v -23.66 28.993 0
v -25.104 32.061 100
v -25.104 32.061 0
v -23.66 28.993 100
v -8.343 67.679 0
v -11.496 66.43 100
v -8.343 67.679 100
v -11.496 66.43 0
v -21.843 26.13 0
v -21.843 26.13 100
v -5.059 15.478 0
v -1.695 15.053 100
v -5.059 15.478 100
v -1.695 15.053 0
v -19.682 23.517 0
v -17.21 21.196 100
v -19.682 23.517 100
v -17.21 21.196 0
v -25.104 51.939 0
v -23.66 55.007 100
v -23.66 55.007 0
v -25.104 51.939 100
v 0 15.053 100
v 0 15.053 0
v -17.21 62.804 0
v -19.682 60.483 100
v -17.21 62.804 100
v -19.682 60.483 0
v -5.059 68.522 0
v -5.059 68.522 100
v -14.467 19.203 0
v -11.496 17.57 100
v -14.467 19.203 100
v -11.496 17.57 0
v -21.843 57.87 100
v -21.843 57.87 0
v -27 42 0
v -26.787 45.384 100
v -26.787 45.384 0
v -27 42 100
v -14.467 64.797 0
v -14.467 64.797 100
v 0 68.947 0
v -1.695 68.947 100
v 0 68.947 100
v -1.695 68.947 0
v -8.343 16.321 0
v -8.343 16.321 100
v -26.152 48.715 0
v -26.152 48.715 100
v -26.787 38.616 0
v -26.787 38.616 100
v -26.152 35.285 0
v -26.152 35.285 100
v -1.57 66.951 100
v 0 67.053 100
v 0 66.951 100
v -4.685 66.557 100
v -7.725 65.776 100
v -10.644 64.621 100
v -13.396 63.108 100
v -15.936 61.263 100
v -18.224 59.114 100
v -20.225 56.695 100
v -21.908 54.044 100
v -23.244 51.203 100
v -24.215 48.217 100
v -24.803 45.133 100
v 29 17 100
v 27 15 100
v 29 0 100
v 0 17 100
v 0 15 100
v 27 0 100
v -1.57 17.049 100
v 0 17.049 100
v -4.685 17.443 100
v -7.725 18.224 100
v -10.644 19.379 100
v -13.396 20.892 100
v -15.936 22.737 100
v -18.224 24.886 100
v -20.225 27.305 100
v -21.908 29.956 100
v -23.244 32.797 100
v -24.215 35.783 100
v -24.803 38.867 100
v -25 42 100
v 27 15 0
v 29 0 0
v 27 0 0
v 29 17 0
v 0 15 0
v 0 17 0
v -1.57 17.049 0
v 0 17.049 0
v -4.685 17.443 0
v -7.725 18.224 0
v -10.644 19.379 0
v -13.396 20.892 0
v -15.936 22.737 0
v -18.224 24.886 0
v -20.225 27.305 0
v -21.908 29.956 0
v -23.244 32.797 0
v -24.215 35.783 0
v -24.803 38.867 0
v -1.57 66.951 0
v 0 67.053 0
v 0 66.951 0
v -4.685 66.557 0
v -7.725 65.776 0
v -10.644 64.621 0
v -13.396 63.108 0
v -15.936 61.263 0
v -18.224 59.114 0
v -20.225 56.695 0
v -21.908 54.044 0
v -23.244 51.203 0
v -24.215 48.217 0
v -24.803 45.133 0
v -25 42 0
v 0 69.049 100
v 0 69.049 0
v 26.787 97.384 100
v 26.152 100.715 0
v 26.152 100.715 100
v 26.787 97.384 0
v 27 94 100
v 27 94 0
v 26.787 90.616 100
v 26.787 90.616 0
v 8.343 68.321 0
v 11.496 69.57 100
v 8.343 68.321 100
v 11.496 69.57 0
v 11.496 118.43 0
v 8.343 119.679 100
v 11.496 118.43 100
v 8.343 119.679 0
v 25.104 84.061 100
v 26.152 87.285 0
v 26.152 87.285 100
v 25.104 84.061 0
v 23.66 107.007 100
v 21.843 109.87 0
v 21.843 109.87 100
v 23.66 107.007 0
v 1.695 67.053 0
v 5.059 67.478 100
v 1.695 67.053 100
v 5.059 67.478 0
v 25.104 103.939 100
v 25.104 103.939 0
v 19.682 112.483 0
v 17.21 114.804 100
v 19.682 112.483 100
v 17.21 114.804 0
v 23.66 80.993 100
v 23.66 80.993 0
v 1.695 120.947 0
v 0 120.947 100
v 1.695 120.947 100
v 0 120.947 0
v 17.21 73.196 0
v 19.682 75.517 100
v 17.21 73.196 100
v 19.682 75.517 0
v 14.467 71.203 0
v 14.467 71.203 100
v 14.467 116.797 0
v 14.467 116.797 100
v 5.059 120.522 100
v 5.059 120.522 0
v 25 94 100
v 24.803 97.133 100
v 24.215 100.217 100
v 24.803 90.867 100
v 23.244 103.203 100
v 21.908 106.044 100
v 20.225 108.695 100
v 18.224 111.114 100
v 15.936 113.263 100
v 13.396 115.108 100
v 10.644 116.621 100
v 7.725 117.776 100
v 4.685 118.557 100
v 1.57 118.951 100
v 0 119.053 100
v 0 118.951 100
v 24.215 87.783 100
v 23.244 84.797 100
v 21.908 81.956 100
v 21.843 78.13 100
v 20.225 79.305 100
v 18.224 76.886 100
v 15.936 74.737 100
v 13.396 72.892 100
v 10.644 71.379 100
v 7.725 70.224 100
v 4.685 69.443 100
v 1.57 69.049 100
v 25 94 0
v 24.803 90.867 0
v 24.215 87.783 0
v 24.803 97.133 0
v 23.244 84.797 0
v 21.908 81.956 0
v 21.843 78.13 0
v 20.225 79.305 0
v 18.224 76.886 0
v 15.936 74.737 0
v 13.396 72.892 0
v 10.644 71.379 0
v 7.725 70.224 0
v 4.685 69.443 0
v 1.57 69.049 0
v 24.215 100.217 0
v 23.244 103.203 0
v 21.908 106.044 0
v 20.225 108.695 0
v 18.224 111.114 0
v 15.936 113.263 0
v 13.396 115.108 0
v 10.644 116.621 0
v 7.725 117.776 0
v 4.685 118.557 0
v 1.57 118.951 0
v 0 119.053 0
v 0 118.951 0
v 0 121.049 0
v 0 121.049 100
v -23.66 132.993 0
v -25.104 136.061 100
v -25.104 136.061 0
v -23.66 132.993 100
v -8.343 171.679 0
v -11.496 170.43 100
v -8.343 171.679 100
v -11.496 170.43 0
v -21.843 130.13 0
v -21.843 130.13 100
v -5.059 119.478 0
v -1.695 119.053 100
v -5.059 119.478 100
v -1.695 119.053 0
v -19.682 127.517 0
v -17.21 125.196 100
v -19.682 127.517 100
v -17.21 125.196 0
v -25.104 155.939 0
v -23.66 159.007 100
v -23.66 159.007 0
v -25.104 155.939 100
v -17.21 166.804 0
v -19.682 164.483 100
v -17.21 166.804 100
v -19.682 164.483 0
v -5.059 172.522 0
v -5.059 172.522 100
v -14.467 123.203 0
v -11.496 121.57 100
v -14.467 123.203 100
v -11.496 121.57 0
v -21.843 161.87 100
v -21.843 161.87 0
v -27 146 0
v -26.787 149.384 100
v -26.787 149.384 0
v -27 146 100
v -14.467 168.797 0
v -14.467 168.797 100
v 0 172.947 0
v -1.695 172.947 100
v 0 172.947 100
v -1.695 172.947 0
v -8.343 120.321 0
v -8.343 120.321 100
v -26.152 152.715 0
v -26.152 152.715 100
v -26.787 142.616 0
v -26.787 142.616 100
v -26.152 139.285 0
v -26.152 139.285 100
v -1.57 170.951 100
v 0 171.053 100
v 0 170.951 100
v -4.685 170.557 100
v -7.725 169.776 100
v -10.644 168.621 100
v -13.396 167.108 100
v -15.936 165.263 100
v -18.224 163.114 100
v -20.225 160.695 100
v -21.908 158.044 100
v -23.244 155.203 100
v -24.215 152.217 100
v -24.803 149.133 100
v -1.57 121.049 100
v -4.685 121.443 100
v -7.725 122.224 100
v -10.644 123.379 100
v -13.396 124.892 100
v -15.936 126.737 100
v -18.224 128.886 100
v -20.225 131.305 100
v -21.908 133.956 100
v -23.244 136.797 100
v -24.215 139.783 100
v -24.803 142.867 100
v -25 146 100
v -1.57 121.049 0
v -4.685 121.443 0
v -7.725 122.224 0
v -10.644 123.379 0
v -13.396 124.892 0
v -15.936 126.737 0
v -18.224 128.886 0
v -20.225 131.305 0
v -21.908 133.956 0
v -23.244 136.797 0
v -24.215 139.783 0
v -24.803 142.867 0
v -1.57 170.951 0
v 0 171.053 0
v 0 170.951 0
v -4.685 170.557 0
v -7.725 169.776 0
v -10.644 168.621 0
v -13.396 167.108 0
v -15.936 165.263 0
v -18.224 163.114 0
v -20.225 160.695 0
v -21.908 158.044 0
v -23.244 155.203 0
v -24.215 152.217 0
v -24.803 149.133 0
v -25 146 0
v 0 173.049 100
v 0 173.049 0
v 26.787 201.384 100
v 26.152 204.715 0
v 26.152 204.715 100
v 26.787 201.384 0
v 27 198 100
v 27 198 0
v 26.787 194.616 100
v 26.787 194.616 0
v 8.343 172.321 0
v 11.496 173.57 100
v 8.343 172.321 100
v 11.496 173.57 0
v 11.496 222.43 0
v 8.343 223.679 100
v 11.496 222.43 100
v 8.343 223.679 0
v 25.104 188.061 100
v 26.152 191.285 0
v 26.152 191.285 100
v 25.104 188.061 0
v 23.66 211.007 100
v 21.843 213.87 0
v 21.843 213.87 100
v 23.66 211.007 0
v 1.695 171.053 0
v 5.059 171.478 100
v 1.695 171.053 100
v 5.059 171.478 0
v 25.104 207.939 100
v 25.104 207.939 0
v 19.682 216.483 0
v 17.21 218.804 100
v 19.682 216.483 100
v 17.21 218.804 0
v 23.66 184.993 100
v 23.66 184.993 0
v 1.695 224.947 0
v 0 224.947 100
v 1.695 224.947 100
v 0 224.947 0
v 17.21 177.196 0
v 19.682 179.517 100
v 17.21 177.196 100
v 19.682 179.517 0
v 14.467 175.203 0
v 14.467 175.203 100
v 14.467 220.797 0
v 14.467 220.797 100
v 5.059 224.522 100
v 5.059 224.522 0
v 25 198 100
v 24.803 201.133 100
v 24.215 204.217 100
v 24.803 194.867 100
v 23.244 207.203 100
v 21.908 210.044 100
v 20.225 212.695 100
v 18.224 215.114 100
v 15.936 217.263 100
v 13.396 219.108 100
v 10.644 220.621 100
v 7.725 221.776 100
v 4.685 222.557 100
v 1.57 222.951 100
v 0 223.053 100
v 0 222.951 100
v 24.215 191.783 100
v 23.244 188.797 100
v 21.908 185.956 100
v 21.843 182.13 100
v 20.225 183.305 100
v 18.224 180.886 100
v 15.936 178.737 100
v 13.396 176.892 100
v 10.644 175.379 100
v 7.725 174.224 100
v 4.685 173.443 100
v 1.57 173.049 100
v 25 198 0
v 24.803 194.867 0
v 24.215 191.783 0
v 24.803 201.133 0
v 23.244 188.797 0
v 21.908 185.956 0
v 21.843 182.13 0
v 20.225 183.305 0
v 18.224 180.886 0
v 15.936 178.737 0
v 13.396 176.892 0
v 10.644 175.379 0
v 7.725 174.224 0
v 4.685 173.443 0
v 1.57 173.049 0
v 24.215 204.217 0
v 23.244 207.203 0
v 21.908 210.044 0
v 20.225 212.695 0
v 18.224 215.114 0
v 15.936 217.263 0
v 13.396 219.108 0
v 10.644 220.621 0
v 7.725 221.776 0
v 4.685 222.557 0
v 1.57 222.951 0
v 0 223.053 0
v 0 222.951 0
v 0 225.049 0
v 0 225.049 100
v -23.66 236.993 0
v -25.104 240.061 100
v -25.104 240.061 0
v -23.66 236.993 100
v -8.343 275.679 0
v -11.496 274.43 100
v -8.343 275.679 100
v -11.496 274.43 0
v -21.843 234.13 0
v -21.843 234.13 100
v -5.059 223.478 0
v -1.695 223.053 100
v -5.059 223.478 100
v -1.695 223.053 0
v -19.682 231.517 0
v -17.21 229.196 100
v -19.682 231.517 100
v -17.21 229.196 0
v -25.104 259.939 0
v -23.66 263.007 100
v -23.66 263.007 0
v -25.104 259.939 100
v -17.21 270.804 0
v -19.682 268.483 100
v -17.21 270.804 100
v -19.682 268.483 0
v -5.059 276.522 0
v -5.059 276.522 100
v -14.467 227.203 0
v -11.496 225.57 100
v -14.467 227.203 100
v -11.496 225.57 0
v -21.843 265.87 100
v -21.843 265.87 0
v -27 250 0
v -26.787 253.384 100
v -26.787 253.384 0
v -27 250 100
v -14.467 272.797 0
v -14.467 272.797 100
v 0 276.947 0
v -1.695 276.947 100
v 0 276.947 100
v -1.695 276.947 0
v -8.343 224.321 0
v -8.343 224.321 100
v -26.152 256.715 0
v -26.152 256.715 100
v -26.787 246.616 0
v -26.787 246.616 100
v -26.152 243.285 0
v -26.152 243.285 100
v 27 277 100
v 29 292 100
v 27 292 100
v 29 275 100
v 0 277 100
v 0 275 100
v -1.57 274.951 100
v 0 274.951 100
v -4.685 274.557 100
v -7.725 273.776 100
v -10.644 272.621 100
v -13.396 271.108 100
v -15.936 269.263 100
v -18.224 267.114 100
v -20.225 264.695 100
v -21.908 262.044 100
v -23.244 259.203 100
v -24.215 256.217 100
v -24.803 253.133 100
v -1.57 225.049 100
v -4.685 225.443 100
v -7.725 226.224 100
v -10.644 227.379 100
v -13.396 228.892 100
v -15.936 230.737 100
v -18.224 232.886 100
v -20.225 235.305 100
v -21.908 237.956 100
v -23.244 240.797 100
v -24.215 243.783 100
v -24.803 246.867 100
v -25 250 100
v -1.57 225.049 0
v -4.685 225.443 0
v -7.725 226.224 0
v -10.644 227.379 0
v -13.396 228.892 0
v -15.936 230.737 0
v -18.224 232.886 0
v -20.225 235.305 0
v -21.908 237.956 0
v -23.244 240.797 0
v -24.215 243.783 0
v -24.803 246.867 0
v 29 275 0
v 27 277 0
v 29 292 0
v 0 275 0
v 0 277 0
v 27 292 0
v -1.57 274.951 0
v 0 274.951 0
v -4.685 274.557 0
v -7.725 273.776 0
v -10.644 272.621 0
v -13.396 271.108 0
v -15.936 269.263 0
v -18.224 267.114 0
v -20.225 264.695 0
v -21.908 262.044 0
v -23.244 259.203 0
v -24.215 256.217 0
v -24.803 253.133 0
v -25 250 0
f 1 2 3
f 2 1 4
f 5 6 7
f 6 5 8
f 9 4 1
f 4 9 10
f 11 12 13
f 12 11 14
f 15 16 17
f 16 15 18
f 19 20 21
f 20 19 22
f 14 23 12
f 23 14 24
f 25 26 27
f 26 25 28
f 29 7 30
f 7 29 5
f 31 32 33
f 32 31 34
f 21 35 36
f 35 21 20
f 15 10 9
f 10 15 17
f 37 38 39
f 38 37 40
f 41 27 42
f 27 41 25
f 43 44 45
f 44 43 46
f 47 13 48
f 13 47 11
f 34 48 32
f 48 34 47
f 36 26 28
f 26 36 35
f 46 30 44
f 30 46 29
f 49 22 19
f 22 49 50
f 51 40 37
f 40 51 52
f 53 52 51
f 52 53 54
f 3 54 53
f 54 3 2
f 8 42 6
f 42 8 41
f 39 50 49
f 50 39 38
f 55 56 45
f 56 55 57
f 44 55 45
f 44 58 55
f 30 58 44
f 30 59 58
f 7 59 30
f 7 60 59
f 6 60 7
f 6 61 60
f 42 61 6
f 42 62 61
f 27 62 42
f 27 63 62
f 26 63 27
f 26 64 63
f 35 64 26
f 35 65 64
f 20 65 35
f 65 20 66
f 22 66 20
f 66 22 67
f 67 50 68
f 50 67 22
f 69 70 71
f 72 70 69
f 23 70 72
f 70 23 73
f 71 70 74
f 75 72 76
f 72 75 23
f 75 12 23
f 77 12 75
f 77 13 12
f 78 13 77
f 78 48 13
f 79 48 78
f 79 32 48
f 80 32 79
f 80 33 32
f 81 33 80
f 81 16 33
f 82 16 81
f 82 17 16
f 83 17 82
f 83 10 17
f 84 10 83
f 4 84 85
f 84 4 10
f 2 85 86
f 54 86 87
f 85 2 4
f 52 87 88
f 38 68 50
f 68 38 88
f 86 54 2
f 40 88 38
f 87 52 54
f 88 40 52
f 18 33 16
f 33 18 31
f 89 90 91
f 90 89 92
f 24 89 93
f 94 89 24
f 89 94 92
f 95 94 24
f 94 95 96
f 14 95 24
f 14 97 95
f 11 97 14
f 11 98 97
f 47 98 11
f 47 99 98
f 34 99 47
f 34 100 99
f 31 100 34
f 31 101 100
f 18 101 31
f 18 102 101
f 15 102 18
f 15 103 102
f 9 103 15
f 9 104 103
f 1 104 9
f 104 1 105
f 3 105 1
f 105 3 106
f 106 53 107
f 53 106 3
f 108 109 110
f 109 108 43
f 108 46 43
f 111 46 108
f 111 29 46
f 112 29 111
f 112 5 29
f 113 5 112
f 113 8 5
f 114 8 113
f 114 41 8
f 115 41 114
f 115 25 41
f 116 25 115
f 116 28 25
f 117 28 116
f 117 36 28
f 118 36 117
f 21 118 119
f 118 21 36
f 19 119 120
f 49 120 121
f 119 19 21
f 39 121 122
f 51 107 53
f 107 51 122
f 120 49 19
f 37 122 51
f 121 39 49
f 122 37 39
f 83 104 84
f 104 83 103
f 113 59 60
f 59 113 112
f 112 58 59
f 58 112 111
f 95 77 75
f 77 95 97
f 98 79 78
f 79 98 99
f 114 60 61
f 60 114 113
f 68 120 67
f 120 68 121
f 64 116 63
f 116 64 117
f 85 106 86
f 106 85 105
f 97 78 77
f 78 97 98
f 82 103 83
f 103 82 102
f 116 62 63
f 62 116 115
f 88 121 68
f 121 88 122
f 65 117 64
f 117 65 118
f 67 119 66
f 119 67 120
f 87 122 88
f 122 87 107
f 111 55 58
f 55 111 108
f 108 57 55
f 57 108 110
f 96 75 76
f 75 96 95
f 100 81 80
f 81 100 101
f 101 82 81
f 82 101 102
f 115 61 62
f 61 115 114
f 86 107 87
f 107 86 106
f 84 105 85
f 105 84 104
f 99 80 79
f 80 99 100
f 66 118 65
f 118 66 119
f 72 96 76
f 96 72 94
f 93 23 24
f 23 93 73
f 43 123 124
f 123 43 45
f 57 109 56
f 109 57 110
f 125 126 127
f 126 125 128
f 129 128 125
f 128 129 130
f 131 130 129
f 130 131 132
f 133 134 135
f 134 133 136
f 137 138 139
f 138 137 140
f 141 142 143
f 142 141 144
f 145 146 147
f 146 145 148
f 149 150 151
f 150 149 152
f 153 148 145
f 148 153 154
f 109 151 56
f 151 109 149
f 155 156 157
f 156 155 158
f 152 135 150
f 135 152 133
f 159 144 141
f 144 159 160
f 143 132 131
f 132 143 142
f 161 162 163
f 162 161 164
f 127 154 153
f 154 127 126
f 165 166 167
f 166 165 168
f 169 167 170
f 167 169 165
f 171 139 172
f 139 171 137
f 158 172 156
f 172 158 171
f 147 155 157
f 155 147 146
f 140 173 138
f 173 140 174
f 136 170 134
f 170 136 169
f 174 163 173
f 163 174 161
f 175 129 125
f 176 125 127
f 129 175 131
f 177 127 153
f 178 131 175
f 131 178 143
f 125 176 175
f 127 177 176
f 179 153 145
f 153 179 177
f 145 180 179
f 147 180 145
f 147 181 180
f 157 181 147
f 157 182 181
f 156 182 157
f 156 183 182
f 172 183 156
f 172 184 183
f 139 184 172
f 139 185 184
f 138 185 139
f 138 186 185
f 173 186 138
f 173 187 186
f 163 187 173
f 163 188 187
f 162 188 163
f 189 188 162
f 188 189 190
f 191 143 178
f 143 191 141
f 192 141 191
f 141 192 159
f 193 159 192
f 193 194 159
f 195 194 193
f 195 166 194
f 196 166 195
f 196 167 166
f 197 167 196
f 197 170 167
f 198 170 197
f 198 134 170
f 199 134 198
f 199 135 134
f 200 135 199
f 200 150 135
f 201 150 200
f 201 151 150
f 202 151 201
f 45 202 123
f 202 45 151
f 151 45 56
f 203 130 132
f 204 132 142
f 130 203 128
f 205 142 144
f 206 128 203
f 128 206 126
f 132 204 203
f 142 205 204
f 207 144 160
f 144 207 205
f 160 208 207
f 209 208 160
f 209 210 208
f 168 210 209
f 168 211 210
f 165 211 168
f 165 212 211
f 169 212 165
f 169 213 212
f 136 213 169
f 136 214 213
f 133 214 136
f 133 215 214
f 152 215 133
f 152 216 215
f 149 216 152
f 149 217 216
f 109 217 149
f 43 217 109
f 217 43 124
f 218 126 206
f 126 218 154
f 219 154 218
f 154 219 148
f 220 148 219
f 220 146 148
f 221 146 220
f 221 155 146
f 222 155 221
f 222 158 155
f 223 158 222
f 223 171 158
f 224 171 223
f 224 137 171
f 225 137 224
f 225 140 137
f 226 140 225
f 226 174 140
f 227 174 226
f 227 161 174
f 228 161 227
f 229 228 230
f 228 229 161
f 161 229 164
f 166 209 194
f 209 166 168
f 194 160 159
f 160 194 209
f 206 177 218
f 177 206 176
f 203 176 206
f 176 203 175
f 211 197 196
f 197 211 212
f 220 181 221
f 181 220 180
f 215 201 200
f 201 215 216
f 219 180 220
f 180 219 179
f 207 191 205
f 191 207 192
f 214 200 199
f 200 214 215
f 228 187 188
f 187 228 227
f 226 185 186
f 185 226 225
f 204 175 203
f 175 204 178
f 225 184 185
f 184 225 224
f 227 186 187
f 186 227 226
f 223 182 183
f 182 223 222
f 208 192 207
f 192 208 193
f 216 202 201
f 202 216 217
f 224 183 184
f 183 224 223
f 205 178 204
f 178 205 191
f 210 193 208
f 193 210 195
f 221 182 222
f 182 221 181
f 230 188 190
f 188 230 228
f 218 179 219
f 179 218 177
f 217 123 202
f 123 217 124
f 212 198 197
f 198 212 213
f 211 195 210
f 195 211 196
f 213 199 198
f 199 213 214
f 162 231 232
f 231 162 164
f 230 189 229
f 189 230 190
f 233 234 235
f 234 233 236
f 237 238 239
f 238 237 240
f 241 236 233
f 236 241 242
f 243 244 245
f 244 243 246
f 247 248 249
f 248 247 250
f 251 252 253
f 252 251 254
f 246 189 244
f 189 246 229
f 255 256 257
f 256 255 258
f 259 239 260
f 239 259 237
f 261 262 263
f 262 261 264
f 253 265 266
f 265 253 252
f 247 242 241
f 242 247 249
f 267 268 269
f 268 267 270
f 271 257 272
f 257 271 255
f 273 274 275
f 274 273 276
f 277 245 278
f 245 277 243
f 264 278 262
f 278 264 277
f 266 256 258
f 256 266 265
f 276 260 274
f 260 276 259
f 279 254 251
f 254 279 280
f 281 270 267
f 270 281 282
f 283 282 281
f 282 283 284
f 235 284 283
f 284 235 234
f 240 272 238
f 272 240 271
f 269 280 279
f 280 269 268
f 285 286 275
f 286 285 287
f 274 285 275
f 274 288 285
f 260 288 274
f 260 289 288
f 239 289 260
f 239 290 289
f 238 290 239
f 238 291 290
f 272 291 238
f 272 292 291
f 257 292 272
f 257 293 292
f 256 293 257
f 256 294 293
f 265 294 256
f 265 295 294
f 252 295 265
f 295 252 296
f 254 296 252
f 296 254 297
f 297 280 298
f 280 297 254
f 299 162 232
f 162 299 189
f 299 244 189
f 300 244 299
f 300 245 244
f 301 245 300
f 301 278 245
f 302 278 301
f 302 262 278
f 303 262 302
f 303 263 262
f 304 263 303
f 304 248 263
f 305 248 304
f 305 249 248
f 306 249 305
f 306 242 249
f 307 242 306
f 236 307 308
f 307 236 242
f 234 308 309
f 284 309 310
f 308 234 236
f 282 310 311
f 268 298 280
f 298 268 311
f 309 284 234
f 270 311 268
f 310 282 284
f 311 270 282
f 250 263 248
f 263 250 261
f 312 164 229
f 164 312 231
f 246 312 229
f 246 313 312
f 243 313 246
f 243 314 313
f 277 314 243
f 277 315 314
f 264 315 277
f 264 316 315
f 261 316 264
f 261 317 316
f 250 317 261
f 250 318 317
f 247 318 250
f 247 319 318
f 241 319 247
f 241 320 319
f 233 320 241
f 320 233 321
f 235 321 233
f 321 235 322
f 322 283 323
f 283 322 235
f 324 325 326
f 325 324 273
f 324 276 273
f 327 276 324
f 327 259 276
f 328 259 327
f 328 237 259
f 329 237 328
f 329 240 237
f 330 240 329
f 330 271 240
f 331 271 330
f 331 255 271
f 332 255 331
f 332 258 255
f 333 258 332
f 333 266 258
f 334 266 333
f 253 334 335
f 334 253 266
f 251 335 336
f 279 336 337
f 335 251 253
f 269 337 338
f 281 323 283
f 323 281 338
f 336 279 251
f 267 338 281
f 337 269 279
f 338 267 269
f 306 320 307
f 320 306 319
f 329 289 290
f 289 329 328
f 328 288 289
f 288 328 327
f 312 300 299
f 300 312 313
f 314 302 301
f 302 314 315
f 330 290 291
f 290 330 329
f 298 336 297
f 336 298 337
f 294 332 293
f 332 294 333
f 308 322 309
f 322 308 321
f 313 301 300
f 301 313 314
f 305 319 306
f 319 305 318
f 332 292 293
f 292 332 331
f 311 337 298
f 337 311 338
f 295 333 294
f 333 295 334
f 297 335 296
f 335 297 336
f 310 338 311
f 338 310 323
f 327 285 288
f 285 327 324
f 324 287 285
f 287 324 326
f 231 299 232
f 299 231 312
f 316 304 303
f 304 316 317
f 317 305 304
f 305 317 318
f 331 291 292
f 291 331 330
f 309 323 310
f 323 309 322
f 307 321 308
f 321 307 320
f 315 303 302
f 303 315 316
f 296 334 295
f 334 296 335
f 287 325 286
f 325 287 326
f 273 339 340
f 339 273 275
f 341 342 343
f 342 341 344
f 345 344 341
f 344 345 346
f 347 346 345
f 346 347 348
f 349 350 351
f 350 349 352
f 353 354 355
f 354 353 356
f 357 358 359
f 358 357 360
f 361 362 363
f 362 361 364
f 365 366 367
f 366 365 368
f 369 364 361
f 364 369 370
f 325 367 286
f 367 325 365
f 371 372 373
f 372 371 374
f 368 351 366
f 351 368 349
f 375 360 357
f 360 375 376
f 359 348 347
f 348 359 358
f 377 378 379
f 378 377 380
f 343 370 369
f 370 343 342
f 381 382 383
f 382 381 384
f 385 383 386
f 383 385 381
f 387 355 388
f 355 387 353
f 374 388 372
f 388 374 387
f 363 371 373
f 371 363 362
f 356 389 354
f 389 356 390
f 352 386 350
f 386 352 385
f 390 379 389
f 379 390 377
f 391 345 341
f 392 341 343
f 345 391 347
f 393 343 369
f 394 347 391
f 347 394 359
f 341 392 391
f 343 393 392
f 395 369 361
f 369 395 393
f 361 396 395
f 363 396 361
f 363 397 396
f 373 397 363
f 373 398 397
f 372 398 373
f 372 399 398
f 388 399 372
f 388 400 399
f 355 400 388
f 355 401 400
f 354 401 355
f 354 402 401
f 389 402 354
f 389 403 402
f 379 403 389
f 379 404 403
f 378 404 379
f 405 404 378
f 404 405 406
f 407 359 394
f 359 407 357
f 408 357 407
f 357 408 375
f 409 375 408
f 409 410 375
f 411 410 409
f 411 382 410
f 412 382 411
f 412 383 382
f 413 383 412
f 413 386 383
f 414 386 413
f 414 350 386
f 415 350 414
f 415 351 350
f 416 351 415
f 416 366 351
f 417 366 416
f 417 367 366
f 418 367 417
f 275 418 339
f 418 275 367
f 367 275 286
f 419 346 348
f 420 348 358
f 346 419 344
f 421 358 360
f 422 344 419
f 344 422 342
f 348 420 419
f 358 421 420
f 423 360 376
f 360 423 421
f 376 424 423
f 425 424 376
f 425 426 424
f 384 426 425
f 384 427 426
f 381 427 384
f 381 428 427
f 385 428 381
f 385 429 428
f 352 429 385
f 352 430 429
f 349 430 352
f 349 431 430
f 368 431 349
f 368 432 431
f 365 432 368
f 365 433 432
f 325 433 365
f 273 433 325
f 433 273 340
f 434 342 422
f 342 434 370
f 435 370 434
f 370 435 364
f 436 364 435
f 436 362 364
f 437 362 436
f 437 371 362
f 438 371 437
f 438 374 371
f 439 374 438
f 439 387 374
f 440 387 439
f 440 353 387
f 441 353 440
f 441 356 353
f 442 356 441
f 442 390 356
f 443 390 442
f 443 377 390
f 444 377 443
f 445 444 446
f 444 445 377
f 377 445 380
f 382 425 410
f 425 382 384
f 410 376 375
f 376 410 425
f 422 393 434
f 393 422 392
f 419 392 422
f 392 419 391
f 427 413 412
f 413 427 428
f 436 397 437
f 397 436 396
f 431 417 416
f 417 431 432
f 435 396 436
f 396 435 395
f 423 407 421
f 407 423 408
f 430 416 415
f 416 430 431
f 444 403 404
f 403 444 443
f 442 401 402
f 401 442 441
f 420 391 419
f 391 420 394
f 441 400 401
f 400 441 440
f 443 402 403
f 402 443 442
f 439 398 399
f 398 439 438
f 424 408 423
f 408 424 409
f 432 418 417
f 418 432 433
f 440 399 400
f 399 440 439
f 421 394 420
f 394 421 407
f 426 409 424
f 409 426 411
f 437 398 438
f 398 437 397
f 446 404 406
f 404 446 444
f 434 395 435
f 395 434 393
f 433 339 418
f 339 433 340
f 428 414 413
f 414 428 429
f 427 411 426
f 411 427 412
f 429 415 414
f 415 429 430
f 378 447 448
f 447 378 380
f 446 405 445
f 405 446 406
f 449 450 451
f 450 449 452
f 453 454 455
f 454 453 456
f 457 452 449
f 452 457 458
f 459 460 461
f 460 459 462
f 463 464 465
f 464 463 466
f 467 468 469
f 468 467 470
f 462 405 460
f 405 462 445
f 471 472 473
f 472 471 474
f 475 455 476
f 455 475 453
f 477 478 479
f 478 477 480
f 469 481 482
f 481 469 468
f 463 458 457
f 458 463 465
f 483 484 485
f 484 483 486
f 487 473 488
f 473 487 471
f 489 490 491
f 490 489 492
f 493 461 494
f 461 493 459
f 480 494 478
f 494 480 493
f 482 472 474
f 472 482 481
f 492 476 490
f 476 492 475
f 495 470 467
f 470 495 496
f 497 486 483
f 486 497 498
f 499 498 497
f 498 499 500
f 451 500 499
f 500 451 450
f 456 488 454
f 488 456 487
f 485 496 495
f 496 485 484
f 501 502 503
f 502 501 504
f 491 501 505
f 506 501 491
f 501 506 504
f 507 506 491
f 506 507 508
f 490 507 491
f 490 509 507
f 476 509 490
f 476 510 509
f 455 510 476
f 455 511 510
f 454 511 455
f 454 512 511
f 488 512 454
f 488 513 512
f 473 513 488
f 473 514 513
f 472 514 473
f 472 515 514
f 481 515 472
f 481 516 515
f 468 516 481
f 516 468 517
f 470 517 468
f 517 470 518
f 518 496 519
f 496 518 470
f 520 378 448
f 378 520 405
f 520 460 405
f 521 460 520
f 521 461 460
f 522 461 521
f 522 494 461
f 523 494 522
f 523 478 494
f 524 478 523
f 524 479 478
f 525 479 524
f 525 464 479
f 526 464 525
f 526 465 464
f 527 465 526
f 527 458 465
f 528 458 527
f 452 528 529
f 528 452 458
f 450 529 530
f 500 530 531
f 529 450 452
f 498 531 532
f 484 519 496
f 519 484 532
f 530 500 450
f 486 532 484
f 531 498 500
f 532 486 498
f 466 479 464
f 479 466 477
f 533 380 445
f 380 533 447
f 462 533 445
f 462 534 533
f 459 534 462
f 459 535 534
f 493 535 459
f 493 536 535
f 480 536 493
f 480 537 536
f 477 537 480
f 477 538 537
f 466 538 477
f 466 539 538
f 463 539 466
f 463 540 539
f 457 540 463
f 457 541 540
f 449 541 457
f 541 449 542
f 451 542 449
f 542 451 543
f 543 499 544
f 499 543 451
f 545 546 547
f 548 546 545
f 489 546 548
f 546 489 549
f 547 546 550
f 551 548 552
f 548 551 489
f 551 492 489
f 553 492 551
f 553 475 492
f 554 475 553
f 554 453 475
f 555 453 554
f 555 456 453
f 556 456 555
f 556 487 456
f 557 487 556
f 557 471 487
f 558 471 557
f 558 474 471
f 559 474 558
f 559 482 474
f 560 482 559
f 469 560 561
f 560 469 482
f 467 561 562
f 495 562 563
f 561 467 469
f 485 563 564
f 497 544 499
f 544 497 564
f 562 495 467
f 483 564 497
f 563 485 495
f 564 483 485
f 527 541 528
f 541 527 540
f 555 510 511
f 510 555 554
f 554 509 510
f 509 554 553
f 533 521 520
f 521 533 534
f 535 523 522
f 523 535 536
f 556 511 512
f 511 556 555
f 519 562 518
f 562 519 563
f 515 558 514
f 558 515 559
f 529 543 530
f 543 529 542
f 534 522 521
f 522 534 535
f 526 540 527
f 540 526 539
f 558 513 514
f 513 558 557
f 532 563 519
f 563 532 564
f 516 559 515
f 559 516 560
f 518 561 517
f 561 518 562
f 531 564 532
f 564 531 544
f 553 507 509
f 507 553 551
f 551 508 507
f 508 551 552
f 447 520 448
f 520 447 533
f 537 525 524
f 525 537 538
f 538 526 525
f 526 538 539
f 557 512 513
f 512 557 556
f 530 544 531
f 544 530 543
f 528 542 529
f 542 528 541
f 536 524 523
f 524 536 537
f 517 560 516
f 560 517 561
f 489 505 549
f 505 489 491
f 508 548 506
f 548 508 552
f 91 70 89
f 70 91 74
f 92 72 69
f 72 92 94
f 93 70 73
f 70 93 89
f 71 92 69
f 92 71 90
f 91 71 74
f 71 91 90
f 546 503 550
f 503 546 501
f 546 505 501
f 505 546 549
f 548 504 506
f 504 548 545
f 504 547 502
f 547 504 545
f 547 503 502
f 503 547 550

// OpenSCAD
// number of trays
n=2; // [0, 1, 2, 3, 4, 5]
// length of tray (cm)
l=10; // [5:1:20]
// diameter of trays (cm)
d=5.0; // [3:0.5:10]
// thickness (mm)
t=2.0; // [0.5:0.5:10]

translate([0,15,0])
cube([5*d+t,t,l*10]);
translate([5*d+t,0,0])
cube([t,15+t,l*10]);

translate([0,15+(n*2+1)*(10*d+t),0])
cube([5*d+t,t,l*10]);
translate([5*d+t,15+(n*2+1)*(10*d+t),0])
cube([t,15+t,l*10]);

translate([0,(d*5)+15+t,0])
difference()
{
    cylinder(r=(d*5)+t,h=l*10,$fn=50);
    translate([0,0,-1])
    cylinder(r=d*5,h=(l*10)+2,$fn=50);
    translate([0,-d*10,-1])
    cube([d*20,d*20,l*20]);
}
for(i=[1:n])
{
   translate([0,(5*d)+t+15+((i*2)-1)*(d*10+t),0])
   difference()
    {
        cylinder(r=(d*5)+t,h=l*10,$fn=50);
        translate([0,0,-1])
        cylinder(r=d*5,h=(l*10)+2,$fn=50);
        translate([-d*20,-d*10,-1])
        cube([d*20,d*20,l*20]);
    } 
    translate([0,(5*d)+t+15+i*2*(d*10+t),0])
    difference()
    {
        cylinder(r=(d*5)+t,h=l*10,$fn=50);
        translate([0,0,-1])
        cylinder(r=d*5,h=(l*10)+2,$fn=50);
        translate([0,-d*10,-1])
        cube([d*20,d*20,l*20]);
    } 
}
